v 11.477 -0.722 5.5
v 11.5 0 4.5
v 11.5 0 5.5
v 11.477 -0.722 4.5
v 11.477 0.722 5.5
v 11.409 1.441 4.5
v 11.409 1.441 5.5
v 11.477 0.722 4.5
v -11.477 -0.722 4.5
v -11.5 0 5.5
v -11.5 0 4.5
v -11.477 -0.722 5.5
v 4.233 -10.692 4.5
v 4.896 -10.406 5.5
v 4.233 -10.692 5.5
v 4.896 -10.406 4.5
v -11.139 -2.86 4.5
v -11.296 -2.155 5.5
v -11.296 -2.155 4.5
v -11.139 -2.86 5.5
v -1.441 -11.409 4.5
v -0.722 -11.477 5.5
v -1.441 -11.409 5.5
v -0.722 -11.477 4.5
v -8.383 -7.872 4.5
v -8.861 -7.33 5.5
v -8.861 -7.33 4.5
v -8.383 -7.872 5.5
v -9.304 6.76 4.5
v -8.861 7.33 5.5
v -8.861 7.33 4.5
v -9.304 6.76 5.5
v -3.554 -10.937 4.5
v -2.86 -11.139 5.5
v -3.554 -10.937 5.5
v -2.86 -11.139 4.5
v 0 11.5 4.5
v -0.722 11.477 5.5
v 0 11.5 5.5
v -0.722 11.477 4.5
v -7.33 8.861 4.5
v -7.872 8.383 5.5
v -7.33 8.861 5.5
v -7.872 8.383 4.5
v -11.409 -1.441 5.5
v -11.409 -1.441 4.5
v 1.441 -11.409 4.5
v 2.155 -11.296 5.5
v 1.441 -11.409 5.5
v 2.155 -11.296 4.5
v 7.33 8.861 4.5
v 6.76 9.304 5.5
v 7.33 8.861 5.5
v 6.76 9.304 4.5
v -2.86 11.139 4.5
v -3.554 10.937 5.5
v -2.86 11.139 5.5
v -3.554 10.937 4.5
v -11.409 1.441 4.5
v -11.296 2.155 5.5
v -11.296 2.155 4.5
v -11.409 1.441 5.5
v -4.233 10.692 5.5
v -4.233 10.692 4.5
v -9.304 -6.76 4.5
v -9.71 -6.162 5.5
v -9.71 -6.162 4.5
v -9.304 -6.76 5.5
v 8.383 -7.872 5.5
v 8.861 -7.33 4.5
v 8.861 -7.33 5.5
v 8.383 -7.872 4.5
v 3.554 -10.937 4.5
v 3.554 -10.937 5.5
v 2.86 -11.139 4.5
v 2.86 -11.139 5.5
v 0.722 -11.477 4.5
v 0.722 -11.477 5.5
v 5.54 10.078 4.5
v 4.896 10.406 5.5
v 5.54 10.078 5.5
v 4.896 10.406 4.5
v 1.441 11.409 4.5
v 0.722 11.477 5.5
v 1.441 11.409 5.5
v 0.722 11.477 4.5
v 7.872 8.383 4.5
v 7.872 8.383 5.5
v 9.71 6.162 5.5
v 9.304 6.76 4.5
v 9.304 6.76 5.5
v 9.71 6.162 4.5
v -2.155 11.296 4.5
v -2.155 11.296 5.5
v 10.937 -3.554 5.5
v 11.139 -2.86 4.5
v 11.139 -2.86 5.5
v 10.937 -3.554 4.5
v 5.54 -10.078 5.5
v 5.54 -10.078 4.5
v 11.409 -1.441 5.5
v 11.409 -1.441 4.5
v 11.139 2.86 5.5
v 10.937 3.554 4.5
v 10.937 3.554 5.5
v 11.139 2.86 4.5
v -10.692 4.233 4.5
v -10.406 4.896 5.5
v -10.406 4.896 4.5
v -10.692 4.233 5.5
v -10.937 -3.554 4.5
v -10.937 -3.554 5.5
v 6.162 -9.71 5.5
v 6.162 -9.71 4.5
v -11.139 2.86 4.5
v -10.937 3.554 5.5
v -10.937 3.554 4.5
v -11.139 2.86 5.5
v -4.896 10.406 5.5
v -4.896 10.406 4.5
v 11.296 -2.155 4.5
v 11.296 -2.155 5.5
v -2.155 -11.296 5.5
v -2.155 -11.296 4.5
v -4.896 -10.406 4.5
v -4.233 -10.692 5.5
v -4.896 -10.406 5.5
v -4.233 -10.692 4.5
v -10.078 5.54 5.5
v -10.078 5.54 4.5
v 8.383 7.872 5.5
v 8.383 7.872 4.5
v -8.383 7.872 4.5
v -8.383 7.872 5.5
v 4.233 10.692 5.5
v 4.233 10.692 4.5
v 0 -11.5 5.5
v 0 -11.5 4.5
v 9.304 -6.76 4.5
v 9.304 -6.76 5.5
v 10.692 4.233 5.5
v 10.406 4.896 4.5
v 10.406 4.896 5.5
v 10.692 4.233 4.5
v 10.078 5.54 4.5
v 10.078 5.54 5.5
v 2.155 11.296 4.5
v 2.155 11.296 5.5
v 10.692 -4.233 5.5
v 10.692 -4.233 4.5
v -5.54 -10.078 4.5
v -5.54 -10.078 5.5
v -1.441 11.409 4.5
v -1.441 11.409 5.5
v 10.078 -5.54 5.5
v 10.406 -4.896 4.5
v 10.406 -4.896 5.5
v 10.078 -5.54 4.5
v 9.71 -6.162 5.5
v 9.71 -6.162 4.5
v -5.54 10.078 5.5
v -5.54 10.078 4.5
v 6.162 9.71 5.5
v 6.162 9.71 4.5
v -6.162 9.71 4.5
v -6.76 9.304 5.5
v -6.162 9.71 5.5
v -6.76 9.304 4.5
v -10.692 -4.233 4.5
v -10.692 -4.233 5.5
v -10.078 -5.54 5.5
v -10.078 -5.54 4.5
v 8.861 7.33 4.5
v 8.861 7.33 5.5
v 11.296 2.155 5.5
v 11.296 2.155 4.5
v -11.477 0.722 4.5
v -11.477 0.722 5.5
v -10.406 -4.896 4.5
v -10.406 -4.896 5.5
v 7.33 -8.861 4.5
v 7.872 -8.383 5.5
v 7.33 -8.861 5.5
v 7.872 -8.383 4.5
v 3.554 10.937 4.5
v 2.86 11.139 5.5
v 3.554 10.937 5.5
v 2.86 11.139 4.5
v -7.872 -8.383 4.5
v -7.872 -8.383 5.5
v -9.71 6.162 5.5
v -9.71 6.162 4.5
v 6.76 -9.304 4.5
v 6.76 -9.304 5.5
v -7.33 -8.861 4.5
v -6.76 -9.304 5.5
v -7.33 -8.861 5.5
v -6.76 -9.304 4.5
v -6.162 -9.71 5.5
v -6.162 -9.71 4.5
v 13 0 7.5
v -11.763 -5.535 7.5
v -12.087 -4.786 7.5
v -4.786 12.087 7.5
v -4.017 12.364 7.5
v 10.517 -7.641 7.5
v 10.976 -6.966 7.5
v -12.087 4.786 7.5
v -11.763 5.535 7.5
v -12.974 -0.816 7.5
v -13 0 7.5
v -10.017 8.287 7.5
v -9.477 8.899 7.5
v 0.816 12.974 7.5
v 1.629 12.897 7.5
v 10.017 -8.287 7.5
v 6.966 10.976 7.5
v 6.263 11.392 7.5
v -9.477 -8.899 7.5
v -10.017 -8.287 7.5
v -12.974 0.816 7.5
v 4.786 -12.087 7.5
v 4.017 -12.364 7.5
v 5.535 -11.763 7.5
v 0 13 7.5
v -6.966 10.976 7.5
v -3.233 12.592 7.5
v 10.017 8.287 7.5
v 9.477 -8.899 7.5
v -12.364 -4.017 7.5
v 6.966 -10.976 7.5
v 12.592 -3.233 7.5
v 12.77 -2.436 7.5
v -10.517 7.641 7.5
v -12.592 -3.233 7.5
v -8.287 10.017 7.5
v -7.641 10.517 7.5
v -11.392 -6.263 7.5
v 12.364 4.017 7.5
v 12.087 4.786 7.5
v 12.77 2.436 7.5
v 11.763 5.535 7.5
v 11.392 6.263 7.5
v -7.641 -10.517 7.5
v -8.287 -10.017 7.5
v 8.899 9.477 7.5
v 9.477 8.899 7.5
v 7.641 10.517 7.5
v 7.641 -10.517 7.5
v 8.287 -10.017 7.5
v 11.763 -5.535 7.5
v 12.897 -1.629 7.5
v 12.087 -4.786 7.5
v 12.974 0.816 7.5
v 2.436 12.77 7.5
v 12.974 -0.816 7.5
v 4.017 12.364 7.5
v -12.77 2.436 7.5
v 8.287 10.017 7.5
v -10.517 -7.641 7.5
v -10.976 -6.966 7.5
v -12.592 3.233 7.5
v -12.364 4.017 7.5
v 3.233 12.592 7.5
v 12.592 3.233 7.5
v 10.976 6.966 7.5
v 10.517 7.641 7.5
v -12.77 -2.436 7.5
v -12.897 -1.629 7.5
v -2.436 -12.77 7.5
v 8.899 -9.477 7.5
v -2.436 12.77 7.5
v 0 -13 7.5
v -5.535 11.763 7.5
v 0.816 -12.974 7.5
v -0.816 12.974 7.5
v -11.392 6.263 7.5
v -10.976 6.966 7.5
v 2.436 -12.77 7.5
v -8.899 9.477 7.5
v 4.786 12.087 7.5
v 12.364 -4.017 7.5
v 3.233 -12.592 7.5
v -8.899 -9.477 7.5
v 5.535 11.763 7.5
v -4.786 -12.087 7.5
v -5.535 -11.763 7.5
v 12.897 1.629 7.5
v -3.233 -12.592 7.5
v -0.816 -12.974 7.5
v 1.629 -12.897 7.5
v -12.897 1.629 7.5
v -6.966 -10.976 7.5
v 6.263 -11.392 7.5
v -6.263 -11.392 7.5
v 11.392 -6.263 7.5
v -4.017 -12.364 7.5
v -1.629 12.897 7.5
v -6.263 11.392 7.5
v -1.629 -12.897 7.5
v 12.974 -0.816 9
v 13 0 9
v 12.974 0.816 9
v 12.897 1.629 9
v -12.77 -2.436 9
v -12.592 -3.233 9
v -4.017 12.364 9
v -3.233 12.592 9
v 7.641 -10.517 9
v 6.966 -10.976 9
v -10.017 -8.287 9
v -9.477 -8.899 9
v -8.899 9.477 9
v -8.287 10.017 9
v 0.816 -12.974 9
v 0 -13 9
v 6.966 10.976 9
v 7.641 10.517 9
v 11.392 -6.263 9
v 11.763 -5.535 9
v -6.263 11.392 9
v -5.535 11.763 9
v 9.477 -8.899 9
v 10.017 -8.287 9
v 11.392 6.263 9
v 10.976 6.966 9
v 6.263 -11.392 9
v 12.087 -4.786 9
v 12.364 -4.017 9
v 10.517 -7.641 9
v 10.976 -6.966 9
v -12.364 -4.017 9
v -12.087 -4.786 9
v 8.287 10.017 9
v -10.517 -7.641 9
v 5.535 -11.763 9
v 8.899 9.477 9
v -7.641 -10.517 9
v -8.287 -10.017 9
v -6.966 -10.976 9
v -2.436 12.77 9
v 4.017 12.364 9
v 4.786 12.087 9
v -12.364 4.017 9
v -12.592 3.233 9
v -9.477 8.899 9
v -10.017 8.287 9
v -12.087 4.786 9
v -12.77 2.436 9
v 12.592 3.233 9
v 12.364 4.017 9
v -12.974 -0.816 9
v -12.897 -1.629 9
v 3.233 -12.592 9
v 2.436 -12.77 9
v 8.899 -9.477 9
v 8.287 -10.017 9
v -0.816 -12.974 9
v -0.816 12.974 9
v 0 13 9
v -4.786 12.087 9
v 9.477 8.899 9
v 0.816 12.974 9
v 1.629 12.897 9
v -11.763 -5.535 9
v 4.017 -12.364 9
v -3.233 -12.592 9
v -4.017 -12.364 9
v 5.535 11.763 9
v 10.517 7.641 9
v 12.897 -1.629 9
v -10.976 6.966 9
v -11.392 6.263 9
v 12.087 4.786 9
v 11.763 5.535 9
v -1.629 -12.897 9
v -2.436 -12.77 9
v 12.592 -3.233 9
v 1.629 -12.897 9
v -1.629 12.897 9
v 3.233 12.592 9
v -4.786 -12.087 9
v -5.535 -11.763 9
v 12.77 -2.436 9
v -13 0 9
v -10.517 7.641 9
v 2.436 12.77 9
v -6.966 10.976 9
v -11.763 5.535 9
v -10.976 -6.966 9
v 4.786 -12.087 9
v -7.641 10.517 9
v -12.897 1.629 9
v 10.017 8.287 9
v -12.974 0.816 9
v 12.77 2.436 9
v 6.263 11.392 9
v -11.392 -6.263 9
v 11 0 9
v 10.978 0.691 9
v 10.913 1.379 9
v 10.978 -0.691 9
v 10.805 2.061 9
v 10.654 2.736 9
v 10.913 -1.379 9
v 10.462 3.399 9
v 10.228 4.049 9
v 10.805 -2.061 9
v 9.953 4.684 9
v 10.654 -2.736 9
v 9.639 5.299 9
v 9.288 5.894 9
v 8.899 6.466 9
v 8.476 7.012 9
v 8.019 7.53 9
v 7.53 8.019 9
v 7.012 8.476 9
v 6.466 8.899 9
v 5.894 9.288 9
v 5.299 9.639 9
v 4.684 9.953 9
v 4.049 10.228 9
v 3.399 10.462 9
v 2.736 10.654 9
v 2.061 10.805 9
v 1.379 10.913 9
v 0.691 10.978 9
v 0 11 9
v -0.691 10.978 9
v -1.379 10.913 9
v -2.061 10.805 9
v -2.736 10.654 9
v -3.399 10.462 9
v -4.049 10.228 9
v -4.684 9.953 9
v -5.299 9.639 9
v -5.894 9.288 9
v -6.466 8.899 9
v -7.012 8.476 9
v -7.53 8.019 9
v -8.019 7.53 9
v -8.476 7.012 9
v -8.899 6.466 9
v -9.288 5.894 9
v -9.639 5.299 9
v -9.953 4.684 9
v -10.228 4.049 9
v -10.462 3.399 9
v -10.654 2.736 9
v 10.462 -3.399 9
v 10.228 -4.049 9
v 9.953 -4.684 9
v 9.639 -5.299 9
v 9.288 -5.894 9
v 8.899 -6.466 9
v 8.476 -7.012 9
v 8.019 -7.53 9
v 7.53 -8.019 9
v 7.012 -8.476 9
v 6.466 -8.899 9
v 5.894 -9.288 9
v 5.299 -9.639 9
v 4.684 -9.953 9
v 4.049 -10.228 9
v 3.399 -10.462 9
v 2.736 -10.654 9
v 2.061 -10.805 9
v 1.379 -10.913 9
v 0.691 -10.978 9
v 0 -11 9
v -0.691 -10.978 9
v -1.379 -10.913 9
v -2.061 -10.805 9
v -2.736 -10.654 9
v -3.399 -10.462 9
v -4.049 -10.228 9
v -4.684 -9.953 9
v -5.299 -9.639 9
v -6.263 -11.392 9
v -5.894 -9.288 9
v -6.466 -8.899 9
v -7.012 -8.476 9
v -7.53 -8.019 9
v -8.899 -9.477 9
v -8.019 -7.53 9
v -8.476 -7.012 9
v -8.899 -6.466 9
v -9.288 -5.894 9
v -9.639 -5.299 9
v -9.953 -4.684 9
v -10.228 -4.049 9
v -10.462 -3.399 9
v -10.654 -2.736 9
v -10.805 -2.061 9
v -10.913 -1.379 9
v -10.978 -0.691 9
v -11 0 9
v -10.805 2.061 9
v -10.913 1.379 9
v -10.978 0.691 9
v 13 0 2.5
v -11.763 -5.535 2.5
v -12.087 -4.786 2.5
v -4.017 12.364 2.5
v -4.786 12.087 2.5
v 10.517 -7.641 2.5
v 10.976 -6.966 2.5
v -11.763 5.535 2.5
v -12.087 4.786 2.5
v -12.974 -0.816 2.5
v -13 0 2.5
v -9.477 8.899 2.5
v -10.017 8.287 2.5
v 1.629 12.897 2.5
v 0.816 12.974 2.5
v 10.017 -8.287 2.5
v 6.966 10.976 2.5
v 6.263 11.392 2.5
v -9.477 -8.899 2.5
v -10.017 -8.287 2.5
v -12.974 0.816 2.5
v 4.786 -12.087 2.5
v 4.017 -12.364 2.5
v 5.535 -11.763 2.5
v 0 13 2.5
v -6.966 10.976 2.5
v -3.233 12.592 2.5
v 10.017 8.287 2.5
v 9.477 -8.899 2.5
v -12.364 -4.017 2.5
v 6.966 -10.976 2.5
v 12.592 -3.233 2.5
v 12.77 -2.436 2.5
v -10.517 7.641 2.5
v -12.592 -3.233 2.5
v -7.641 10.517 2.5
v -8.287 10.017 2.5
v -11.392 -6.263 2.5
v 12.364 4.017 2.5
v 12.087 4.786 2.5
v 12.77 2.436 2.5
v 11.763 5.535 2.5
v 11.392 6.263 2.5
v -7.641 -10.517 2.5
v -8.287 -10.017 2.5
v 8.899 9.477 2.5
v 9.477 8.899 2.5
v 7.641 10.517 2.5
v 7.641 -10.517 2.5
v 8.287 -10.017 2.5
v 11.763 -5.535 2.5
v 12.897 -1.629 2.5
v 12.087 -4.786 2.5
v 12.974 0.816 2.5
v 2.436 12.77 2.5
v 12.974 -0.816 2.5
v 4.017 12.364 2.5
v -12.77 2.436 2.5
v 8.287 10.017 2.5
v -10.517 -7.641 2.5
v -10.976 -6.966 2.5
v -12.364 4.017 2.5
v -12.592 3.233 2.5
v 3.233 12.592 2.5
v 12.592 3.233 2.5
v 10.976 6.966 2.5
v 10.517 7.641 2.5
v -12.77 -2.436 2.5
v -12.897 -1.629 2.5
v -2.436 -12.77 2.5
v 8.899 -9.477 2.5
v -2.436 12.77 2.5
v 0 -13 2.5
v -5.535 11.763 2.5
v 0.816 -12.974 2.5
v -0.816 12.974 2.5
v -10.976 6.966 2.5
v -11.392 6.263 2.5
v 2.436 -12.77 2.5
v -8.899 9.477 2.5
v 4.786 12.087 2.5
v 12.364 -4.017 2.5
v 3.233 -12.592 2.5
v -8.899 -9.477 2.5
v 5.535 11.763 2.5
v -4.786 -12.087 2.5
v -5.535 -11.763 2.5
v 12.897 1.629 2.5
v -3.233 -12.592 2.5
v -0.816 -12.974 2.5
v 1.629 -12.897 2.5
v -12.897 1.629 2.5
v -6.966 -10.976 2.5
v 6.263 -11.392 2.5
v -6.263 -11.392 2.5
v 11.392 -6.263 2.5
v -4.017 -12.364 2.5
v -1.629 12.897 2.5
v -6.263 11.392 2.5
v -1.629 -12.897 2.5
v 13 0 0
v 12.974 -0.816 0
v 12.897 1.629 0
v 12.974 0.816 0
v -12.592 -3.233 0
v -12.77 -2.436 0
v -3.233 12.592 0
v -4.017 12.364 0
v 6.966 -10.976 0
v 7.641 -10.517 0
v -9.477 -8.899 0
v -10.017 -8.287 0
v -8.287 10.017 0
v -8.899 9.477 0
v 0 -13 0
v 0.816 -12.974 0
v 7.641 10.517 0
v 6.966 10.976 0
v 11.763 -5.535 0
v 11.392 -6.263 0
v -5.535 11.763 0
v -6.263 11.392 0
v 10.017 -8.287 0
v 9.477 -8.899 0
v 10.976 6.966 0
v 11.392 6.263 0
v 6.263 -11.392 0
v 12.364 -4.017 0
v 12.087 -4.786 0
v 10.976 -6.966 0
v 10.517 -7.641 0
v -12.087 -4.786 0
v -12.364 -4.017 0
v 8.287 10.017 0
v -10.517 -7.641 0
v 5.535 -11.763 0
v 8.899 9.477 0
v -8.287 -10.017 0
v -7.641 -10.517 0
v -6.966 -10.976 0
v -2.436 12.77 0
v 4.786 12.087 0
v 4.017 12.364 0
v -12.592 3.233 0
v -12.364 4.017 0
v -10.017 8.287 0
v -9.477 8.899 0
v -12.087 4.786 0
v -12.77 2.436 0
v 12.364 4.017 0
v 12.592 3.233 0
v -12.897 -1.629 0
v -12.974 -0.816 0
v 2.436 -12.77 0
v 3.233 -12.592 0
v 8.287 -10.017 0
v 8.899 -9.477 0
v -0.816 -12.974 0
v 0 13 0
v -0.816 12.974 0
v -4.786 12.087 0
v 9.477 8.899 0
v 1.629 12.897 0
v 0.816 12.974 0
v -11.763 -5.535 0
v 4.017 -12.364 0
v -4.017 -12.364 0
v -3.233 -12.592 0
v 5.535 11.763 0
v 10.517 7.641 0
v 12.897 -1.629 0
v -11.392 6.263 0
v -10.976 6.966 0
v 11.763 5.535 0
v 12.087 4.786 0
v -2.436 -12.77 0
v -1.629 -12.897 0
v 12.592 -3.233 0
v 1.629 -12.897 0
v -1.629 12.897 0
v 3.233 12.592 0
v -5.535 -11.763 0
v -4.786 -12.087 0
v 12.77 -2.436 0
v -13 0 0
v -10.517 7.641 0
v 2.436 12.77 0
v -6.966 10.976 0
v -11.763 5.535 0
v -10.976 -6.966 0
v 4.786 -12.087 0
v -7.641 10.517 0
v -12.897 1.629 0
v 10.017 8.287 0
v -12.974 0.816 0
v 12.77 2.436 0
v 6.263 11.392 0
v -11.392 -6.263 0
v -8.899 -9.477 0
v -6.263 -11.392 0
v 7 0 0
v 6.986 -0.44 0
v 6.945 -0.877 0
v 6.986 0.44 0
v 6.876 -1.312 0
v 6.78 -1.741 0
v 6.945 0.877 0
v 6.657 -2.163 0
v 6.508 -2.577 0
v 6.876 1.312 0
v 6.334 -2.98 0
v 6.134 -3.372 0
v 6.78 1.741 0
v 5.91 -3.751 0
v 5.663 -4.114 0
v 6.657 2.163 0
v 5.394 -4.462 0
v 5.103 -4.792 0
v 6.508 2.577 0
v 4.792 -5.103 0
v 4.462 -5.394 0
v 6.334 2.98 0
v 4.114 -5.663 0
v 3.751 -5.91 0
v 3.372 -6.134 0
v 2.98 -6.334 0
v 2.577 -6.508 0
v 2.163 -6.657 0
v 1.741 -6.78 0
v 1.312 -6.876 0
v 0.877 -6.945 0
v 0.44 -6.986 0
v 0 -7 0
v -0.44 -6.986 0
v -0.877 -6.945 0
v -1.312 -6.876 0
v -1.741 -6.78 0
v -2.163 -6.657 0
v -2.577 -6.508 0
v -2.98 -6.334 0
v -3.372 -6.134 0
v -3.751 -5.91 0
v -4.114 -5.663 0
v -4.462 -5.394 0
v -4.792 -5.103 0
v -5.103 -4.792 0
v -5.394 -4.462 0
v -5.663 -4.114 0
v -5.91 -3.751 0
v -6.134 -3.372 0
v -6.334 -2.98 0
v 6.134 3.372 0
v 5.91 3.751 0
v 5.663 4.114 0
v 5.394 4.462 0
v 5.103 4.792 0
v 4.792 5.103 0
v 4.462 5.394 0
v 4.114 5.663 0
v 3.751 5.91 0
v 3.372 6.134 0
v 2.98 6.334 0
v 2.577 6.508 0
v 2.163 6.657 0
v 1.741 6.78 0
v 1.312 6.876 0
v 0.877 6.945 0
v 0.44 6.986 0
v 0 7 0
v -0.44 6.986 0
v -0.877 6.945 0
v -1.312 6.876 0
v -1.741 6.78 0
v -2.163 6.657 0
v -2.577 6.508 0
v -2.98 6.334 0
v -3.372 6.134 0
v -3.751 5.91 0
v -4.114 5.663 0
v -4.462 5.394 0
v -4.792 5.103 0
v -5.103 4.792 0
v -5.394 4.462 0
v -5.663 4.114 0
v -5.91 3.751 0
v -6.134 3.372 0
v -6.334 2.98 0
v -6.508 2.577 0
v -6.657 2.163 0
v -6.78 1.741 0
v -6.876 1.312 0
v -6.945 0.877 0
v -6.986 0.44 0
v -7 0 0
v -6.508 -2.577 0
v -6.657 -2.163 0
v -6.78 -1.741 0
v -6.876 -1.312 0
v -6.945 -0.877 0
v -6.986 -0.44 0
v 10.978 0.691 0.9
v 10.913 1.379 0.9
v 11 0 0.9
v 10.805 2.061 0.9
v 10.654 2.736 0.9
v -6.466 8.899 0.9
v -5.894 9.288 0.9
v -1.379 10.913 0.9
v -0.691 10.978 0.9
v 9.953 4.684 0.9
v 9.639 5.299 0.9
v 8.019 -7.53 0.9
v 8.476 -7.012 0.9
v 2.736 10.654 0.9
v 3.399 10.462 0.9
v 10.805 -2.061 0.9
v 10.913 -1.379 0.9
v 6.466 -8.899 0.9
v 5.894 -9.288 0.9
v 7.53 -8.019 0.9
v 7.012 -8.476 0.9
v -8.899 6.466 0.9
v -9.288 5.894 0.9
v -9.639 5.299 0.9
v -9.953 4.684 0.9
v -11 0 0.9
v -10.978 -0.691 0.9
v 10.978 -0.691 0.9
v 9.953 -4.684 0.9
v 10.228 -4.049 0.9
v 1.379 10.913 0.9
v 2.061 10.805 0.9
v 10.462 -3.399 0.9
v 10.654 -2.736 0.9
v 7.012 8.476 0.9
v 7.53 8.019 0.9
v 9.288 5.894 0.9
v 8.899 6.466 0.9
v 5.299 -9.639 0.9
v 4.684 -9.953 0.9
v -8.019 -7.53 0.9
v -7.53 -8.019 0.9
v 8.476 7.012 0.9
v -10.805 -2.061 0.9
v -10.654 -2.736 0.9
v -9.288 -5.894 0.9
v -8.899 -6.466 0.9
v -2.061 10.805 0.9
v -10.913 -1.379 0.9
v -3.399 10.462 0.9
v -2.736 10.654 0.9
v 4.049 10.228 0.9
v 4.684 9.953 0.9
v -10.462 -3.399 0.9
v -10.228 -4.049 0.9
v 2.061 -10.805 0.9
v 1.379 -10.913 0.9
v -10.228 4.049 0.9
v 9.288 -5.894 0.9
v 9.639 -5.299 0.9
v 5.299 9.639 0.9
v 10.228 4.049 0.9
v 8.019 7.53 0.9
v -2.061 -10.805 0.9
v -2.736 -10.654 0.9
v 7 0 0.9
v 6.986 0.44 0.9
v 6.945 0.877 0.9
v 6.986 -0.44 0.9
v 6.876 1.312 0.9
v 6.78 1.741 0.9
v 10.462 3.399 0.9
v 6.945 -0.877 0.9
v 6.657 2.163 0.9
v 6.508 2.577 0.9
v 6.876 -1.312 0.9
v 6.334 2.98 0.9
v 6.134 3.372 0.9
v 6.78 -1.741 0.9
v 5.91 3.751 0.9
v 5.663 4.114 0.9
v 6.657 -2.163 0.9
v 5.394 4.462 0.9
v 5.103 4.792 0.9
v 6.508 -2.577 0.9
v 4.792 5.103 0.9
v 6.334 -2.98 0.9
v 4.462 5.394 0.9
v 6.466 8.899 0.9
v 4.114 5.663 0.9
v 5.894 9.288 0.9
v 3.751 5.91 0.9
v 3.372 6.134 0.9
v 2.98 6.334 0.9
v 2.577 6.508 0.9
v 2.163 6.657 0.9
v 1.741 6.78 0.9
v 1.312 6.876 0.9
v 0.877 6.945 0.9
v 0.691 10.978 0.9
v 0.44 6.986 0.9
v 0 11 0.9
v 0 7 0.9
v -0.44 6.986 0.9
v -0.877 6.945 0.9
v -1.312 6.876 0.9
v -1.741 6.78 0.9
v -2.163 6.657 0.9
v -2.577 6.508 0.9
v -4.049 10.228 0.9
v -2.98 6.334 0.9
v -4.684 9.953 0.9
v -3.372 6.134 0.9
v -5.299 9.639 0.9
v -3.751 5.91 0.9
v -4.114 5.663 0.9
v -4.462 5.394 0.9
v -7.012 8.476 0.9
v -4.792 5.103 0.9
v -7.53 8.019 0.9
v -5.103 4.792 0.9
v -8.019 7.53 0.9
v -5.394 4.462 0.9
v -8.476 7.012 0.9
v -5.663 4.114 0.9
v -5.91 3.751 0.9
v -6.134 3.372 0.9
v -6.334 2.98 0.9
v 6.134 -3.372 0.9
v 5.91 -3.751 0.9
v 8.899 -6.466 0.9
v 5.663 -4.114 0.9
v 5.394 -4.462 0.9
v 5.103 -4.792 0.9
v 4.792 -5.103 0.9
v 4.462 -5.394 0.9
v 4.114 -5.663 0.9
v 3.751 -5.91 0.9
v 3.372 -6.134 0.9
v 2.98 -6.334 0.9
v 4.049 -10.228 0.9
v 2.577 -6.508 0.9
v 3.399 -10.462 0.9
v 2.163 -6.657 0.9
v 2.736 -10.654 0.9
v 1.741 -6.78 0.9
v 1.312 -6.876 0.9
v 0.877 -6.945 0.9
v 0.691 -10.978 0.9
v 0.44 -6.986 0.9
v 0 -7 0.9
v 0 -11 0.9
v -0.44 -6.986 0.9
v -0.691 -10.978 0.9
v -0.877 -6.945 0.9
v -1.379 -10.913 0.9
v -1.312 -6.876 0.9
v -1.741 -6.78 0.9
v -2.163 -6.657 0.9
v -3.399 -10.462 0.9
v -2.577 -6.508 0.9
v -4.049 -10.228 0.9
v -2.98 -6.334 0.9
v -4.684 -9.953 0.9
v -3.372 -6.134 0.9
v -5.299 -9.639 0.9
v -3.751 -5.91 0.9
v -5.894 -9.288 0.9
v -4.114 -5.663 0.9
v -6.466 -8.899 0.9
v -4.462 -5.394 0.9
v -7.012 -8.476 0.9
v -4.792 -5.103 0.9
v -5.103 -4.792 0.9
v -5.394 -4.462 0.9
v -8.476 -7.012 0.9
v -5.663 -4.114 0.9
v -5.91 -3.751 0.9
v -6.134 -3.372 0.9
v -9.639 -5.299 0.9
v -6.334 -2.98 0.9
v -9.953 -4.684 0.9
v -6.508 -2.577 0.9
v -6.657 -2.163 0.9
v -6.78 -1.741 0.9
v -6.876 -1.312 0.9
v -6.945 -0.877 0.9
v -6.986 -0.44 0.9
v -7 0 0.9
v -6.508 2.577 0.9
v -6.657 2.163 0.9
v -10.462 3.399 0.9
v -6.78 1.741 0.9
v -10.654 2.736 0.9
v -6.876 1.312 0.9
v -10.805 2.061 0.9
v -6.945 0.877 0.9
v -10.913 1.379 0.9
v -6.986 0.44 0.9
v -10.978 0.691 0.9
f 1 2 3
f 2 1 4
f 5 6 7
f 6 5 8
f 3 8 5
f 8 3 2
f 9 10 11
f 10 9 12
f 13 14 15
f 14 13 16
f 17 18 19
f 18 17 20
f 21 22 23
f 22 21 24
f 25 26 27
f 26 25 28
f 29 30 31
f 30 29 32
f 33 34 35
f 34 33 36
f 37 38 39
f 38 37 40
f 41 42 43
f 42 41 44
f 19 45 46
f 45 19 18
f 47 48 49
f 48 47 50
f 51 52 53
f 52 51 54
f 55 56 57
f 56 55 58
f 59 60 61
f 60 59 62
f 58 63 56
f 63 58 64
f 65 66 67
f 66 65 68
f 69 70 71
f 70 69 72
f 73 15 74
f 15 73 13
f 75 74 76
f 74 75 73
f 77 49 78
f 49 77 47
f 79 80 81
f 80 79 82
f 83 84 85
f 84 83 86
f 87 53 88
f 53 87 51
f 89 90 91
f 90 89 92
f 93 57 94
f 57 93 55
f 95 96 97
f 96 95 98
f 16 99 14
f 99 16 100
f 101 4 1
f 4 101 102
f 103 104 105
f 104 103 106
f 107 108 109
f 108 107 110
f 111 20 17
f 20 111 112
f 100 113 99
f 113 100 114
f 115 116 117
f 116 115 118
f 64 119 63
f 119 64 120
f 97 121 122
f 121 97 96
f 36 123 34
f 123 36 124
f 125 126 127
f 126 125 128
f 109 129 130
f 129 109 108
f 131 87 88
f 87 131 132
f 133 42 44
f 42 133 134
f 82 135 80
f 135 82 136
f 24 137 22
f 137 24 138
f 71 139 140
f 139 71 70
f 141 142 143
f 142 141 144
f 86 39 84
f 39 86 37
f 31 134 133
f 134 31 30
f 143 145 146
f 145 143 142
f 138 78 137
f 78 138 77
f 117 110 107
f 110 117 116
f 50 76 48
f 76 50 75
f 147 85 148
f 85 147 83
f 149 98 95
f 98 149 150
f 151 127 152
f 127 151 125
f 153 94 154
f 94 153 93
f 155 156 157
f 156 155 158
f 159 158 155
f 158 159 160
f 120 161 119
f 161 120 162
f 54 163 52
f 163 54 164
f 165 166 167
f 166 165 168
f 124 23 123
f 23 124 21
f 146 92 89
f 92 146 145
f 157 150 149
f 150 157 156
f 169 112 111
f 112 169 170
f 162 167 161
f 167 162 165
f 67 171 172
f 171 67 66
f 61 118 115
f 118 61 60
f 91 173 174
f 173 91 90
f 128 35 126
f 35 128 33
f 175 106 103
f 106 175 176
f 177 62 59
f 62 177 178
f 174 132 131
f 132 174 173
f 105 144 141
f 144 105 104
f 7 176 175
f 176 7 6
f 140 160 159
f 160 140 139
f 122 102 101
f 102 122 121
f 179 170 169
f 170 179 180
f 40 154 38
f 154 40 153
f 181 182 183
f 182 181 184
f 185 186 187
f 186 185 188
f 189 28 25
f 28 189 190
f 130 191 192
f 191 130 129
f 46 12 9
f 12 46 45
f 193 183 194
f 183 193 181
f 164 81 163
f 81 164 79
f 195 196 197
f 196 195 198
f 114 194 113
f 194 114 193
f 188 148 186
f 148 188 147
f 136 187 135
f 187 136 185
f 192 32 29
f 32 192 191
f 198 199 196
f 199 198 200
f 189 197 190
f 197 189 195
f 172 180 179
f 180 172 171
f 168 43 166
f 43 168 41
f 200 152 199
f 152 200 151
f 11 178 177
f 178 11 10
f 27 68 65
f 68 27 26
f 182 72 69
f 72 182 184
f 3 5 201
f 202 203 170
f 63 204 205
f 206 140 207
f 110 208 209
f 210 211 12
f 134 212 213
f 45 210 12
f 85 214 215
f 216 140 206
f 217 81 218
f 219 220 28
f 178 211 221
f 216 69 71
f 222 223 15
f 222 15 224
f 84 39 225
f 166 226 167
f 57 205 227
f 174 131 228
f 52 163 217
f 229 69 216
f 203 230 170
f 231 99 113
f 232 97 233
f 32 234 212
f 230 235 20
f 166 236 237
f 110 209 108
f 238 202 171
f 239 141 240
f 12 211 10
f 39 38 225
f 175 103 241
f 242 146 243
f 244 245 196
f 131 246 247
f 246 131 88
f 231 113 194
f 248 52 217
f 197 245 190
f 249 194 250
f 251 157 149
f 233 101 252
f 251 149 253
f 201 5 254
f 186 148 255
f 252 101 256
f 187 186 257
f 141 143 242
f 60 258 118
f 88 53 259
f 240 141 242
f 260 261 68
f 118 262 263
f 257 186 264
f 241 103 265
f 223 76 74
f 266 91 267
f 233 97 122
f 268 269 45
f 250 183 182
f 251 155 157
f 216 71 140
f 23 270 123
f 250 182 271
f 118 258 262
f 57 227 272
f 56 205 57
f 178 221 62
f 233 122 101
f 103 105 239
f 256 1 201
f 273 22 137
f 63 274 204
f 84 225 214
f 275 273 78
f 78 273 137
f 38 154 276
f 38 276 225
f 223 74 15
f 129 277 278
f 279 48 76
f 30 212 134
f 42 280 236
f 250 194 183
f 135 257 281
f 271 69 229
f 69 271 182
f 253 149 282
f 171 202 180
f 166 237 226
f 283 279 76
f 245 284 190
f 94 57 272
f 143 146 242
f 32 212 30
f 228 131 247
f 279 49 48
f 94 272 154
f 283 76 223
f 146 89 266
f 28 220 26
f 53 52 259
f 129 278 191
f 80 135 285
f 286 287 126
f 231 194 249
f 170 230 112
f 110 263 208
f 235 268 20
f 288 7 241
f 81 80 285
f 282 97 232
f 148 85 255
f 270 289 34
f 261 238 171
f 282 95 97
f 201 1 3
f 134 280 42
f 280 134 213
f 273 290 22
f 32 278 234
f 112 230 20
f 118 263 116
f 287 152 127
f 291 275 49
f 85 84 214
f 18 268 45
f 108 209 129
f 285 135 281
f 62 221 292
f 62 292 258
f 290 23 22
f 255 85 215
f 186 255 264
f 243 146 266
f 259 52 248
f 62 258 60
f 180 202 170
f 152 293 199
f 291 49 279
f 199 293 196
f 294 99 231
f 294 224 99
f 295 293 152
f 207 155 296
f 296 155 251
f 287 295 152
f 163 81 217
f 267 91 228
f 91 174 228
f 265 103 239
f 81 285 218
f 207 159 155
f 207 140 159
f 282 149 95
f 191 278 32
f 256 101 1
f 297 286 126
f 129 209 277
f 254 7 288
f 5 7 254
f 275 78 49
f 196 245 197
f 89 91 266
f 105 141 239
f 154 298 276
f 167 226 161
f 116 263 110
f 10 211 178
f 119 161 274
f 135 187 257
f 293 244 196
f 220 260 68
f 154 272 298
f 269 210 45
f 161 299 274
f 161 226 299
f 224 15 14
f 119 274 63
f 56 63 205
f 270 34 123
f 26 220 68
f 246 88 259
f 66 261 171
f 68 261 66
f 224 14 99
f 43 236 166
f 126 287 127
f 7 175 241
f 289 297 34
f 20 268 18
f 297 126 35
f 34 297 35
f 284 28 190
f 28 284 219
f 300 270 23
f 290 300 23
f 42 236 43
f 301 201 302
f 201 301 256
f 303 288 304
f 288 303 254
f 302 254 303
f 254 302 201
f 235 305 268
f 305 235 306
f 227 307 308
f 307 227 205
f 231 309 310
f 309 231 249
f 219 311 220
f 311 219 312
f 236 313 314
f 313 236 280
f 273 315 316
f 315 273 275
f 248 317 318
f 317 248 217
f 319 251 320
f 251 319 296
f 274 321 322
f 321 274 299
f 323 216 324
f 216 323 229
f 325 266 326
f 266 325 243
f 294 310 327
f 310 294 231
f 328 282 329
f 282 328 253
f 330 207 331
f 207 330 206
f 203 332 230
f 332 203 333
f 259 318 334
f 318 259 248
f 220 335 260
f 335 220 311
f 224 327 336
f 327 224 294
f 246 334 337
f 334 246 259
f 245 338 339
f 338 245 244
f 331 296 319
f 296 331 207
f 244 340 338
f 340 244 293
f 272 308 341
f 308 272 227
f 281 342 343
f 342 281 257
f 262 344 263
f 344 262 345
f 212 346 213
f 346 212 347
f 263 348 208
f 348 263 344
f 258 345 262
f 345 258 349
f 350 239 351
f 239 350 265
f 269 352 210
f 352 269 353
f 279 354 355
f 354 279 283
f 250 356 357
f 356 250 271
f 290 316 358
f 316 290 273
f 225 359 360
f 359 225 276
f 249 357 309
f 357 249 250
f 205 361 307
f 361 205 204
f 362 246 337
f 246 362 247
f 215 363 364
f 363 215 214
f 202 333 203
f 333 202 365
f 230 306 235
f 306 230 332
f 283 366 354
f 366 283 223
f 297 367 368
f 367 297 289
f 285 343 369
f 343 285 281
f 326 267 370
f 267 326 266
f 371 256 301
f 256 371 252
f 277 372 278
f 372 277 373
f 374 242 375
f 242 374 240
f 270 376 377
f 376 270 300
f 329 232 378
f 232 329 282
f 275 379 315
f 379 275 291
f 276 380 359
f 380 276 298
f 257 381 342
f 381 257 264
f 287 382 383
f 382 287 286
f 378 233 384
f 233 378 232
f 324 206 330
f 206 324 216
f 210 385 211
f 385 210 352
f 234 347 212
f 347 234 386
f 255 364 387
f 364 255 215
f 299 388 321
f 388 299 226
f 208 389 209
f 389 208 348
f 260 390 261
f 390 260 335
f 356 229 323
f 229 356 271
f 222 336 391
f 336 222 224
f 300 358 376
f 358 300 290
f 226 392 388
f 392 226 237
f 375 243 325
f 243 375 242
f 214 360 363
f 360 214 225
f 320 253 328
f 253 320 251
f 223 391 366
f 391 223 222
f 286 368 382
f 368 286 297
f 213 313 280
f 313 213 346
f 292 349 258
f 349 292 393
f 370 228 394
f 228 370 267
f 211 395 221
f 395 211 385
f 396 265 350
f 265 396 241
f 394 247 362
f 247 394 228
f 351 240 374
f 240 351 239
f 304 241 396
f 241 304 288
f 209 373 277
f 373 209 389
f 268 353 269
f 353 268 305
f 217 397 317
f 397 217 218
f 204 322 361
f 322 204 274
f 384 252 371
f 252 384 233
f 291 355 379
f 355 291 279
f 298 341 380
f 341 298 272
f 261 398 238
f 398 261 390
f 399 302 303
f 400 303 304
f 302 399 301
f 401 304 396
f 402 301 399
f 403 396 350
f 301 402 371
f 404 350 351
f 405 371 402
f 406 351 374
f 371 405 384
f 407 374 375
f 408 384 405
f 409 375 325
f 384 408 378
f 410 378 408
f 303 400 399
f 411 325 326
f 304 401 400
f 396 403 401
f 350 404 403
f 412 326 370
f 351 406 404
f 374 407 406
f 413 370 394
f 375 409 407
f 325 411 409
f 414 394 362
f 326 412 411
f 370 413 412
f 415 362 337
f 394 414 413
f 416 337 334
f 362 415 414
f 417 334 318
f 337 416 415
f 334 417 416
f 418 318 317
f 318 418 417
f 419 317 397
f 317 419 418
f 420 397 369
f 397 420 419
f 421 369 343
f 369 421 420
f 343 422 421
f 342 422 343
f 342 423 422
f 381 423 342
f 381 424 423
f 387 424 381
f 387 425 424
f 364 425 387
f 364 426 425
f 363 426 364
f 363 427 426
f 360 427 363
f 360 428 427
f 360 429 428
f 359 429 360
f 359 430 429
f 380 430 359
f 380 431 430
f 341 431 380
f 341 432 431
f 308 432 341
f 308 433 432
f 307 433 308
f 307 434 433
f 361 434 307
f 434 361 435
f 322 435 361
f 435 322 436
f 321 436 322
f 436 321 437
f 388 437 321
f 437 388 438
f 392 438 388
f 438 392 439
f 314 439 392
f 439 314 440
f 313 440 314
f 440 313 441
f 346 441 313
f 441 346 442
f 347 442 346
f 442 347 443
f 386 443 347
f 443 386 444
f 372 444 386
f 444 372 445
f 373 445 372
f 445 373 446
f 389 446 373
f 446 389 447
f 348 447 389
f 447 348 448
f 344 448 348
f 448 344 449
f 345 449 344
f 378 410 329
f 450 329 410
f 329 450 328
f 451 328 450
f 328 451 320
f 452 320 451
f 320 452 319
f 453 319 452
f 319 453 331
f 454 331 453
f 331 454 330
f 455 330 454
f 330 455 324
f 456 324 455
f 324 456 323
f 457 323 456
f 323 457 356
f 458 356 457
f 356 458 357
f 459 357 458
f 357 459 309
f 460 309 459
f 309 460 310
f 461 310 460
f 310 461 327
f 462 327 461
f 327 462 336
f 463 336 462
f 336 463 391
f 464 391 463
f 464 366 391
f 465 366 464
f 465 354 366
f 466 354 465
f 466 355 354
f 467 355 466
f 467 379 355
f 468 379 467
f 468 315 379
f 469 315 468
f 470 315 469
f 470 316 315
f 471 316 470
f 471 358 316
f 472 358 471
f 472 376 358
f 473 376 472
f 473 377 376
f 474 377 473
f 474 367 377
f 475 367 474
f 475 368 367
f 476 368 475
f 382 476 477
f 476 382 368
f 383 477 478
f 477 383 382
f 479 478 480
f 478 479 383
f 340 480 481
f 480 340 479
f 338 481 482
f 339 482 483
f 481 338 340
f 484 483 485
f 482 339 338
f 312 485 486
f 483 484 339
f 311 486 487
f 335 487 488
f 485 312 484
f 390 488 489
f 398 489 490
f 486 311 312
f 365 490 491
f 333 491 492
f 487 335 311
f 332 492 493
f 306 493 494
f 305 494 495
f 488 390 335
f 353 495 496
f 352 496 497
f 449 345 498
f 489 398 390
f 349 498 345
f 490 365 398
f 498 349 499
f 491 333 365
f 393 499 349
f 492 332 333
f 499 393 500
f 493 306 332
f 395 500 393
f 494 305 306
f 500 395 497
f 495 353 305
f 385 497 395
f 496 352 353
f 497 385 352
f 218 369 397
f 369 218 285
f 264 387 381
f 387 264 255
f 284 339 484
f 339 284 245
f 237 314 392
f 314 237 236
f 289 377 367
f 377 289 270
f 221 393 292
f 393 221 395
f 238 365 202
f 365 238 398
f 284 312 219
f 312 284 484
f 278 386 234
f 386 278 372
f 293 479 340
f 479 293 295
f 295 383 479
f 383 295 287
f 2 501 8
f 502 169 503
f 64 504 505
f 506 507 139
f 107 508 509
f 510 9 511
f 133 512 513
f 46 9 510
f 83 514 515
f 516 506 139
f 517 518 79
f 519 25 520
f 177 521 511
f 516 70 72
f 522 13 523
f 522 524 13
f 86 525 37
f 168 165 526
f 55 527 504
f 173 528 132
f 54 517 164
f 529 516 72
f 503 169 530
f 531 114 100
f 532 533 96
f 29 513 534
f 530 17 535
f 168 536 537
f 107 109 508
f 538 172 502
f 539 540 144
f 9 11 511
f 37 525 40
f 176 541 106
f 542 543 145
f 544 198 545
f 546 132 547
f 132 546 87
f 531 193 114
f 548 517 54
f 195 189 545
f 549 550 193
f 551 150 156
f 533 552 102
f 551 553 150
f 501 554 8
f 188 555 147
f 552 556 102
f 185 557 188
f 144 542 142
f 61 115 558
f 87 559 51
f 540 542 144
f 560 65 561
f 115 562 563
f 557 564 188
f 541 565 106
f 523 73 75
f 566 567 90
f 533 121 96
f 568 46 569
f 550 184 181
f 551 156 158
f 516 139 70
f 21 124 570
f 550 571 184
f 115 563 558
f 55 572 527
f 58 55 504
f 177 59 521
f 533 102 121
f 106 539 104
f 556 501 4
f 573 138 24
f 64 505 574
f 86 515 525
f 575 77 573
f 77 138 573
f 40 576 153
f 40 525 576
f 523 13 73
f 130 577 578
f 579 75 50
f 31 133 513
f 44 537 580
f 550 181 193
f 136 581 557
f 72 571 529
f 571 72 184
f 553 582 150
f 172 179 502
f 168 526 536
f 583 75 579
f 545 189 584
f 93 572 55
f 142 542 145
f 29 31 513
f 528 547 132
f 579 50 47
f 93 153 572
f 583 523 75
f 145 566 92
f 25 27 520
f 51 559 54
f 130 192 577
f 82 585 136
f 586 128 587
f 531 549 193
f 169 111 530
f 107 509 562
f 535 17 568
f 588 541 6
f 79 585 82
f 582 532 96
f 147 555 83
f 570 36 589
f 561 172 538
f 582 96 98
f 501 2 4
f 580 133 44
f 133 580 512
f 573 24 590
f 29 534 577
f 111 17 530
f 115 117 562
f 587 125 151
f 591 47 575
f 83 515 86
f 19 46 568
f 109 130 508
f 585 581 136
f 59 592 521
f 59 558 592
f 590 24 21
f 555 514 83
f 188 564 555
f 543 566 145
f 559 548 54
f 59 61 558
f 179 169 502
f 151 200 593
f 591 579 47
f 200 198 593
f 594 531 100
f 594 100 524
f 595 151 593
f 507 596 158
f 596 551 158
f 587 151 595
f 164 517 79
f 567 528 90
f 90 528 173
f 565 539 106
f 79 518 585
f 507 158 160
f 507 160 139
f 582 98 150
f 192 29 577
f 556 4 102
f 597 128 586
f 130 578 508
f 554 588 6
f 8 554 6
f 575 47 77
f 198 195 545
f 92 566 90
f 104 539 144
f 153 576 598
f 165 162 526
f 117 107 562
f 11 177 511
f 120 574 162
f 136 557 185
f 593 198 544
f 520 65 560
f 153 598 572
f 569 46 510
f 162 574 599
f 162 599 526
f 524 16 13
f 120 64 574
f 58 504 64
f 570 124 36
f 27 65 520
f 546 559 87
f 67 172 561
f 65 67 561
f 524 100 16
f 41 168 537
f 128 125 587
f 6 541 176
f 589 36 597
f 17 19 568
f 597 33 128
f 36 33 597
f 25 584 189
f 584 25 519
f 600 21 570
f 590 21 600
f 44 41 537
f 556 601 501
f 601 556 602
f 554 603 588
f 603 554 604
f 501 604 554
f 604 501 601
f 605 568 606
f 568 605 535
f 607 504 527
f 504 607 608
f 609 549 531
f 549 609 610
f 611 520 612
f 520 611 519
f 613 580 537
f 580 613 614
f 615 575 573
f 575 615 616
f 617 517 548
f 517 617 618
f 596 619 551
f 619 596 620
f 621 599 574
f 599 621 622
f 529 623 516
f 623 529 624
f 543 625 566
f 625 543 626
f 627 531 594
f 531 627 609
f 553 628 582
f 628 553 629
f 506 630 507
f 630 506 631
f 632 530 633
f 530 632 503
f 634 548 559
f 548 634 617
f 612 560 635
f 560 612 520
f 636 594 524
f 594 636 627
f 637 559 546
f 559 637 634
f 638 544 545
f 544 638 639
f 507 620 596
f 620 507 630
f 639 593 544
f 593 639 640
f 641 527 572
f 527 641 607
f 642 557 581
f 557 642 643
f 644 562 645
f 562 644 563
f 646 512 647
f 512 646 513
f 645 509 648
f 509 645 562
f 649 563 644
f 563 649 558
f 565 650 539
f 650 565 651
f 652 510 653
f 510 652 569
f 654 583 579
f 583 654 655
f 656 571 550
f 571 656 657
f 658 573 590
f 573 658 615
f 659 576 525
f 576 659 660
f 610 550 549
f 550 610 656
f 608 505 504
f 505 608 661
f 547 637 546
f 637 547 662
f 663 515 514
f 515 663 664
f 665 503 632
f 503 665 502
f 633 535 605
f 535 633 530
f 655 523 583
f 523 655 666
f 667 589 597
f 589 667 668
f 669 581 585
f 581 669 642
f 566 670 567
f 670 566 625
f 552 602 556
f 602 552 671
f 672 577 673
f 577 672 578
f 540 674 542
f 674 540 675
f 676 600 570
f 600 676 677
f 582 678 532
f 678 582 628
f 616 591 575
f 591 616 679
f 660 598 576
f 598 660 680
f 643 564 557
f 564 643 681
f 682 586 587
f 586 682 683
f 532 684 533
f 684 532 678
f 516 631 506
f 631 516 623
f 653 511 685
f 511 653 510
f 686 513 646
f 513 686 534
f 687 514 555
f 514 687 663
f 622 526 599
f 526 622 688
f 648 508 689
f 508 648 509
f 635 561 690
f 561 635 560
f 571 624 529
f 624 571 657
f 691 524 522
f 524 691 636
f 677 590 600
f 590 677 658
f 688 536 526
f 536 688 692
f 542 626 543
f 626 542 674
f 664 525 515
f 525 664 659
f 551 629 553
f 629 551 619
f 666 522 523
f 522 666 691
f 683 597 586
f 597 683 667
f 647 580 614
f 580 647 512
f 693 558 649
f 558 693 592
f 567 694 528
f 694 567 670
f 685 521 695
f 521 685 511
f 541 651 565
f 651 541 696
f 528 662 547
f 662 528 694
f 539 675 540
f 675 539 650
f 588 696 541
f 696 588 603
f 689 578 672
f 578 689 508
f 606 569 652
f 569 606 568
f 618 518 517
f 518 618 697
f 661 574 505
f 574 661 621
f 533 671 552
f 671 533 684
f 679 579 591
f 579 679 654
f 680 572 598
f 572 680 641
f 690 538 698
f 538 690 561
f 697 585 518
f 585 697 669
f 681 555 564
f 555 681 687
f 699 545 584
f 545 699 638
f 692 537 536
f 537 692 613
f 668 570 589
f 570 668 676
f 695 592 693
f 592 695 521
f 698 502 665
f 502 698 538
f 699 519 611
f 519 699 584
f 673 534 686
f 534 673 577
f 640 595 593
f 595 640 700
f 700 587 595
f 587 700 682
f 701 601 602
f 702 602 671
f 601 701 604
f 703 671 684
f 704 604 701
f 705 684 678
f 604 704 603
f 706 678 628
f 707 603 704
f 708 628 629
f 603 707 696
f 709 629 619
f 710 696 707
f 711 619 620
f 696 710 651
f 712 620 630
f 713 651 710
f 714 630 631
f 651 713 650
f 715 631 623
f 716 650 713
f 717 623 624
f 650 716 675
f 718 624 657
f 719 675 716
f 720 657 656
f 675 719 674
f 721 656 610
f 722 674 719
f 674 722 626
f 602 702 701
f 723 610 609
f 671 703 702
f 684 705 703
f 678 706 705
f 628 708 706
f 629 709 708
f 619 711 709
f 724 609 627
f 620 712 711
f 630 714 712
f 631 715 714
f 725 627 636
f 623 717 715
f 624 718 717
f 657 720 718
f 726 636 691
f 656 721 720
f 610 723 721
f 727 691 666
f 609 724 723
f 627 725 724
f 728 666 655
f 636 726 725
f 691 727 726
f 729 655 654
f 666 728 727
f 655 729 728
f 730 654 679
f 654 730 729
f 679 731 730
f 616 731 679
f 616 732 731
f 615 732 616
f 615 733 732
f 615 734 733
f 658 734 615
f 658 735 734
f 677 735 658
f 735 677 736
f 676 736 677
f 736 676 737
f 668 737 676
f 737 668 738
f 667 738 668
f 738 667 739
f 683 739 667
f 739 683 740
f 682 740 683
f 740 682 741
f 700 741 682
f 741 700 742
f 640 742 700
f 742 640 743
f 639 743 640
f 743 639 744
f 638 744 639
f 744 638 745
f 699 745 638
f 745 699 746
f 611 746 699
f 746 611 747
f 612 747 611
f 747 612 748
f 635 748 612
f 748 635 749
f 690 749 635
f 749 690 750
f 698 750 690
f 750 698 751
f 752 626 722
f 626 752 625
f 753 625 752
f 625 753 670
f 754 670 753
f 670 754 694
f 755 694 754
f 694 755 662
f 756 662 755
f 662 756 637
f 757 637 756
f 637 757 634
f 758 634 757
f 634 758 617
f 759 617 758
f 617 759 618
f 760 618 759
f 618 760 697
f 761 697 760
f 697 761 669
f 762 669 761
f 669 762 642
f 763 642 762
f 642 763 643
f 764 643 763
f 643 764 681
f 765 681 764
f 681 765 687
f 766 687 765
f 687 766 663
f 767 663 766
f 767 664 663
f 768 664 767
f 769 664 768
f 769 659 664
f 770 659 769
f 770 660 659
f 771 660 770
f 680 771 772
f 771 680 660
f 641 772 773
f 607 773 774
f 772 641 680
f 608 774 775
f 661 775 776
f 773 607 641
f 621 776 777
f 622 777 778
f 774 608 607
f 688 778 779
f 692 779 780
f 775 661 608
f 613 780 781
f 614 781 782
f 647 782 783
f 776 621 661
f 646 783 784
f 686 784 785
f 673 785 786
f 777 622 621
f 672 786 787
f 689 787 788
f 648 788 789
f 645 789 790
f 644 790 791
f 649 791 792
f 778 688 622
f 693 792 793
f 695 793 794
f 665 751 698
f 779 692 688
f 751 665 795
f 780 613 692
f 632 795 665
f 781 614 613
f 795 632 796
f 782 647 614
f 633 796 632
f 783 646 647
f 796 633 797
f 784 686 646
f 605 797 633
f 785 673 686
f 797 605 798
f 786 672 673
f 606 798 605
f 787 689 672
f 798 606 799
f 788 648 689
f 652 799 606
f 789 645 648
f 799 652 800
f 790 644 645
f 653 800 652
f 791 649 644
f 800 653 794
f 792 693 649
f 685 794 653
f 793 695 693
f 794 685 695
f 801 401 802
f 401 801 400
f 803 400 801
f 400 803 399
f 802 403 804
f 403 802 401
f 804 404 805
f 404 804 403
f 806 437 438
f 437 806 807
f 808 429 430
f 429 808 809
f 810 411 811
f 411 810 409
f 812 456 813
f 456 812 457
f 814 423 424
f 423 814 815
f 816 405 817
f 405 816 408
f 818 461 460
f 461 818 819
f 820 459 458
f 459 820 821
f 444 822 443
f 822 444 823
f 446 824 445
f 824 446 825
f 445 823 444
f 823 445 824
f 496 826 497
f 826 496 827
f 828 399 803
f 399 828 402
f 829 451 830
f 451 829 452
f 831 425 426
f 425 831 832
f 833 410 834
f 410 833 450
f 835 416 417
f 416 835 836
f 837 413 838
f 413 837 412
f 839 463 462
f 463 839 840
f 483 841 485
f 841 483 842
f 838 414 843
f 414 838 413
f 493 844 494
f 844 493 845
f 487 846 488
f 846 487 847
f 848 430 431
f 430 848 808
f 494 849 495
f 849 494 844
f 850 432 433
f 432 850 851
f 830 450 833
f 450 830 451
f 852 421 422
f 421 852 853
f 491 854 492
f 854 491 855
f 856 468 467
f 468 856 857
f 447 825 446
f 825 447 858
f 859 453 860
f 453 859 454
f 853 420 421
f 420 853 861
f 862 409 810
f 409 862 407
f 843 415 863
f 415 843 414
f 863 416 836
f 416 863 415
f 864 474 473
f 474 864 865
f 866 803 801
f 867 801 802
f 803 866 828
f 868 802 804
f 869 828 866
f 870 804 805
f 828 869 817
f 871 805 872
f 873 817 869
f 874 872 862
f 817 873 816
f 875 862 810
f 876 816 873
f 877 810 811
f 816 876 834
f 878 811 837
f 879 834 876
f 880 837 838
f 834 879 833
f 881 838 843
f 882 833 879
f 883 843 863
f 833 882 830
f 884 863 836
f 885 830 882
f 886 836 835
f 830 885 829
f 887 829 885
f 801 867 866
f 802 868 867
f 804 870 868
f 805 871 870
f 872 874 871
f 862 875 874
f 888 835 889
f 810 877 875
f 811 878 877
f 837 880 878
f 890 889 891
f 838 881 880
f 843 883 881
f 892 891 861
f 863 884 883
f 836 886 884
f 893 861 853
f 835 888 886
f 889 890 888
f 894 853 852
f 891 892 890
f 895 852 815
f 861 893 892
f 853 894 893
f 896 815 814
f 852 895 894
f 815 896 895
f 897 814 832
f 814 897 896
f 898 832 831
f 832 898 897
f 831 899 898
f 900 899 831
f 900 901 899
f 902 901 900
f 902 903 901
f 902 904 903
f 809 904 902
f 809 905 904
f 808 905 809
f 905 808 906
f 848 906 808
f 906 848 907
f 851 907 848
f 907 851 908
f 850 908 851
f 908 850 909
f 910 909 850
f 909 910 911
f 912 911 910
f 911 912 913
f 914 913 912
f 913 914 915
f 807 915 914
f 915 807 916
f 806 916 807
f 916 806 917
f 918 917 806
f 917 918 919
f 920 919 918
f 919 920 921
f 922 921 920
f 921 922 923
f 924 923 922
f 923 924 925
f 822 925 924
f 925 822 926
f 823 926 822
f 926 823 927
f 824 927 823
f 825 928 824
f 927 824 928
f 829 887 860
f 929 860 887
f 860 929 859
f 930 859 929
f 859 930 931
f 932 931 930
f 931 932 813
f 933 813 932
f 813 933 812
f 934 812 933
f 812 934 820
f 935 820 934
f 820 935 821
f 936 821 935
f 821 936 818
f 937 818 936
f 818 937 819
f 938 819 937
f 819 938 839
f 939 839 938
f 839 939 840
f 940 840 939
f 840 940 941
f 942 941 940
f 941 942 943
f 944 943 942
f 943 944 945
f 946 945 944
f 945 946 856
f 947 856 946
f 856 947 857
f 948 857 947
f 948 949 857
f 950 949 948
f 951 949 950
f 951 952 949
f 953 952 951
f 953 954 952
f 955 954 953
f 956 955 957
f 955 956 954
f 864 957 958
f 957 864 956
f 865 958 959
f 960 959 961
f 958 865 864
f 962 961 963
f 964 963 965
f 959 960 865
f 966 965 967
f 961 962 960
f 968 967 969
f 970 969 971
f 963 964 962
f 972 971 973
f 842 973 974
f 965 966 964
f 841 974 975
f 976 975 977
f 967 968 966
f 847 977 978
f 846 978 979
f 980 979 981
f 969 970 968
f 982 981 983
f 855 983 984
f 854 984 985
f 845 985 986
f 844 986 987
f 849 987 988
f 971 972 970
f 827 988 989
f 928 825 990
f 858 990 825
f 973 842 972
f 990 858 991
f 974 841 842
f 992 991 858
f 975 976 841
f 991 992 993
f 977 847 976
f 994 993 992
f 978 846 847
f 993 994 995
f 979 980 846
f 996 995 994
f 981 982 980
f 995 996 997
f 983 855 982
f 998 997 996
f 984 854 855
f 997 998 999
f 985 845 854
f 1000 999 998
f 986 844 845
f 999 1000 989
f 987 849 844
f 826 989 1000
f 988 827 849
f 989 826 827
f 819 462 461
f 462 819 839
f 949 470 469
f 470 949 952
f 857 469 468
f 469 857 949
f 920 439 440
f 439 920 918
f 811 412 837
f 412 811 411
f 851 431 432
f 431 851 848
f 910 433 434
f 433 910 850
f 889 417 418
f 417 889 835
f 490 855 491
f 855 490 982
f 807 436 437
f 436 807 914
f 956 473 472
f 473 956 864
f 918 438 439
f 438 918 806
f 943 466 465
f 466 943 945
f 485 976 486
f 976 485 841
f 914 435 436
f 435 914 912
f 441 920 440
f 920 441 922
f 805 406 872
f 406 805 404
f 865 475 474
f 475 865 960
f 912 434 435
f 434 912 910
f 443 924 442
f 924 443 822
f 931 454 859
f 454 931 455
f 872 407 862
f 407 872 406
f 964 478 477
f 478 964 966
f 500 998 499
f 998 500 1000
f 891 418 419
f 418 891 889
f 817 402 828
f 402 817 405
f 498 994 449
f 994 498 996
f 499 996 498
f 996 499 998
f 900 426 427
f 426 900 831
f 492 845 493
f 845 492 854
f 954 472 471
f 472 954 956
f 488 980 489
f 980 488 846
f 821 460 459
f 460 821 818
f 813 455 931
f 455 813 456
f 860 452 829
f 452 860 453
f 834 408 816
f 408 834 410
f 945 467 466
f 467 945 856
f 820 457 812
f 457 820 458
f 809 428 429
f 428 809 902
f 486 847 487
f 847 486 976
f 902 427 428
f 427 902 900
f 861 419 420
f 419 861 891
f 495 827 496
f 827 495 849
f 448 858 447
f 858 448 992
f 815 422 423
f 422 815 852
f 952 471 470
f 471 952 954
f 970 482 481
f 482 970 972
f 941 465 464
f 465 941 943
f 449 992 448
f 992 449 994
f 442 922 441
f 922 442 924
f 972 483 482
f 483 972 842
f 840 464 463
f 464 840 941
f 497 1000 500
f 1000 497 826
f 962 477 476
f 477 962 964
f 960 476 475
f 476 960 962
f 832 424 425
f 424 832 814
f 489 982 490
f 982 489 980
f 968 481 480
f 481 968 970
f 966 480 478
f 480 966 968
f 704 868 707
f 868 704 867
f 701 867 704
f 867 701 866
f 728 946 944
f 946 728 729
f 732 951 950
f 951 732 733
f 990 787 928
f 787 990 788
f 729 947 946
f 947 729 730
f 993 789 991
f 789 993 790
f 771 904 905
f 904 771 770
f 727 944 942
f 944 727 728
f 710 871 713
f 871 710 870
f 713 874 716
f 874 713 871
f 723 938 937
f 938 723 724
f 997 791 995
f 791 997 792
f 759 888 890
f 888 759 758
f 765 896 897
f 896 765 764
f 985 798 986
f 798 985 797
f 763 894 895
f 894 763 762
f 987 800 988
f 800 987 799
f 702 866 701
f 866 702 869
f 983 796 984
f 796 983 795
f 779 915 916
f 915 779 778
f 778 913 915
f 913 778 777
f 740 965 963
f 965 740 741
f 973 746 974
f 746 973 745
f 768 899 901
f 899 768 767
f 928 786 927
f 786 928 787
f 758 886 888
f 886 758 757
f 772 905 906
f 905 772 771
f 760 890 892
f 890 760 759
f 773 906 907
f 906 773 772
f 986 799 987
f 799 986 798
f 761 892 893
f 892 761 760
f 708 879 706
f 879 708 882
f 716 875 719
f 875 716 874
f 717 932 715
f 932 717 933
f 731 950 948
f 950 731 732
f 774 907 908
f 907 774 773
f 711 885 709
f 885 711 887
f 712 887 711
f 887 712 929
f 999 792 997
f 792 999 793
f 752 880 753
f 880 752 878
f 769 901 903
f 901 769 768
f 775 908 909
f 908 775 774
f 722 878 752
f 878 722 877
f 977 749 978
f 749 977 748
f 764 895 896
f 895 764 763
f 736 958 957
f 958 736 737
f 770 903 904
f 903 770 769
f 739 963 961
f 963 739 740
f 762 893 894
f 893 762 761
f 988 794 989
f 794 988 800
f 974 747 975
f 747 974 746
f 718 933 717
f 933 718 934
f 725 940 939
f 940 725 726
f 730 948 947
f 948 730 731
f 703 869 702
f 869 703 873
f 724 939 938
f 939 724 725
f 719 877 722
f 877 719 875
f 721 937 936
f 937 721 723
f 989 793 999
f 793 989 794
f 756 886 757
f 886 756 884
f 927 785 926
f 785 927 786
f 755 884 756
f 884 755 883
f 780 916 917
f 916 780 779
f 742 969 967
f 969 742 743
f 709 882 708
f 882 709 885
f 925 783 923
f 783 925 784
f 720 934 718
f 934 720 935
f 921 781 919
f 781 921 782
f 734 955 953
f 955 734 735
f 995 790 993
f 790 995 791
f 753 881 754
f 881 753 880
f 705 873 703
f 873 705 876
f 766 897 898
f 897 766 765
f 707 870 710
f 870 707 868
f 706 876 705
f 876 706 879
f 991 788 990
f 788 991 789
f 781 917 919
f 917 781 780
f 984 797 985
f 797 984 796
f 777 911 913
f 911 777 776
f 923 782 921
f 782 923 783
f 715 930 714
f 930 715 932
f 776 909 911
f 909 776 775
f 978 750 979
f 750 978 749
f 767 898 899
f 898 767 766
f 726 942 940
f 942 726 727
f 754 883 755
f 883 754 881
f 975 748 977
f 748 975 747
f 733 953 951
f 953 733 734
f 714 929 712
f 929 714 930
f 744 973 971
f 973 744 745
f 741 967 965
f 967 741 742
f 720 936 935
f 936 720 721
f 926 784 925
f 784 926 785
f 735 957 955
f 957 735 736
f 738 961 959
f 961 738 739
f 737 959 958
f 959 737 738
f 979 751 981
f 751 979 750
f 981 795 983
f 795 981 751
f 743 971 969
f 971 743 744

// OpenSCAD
/*
freiBot Pneu
robot wheel to press-fit on bearing
2015 by cho & stahl
*/

$fn=100; // resolution

// dimensions
outer_r = 26/2; // outer radius
inner_r = 22/2; // inner radius / radius of bearing
flange_hole_r = 7;

// construction heights
groove = 0.5; // green
bevel = 2; // deeppink
rim = 1.5; // gold
flange = 1.0; // blue

// make it
build();

module build()
{
    translate([0,0,groove+bevel+rim+flange])
    difference() {
        union() {
            wheel();
            translate([0,0,-(groove+bevel+rim+flange)]) cylinder(r=outer_r, h=flange);
        }
        color("silver") union() {
            translate([0,0,-(bevel+groove+rim+0.1)]) cylinder(r=inner_r, h=20);
            translate([0,0,-(bevel+groove+rim+flange+0.1)]) cylinder(r=flange_hole_r, h=20);
        }
    }
}


module wheel()
{
     union() {
        half_wheel();
        mirror([0,0,1]) half_wheel();
    }
}

module half_wheel()
{
    union() {
        color("green") cylinder(r=inner_r+0.5, h=groove);
        color("deeppink") translate([0,0,groove]) cylinder(r1=inner_r+0.5, r2=outer_r, h=bevel);
        color("gold") translate([0,0,groove+bevel]) cylinder(r=outer_r, h=rim);
    }

}
